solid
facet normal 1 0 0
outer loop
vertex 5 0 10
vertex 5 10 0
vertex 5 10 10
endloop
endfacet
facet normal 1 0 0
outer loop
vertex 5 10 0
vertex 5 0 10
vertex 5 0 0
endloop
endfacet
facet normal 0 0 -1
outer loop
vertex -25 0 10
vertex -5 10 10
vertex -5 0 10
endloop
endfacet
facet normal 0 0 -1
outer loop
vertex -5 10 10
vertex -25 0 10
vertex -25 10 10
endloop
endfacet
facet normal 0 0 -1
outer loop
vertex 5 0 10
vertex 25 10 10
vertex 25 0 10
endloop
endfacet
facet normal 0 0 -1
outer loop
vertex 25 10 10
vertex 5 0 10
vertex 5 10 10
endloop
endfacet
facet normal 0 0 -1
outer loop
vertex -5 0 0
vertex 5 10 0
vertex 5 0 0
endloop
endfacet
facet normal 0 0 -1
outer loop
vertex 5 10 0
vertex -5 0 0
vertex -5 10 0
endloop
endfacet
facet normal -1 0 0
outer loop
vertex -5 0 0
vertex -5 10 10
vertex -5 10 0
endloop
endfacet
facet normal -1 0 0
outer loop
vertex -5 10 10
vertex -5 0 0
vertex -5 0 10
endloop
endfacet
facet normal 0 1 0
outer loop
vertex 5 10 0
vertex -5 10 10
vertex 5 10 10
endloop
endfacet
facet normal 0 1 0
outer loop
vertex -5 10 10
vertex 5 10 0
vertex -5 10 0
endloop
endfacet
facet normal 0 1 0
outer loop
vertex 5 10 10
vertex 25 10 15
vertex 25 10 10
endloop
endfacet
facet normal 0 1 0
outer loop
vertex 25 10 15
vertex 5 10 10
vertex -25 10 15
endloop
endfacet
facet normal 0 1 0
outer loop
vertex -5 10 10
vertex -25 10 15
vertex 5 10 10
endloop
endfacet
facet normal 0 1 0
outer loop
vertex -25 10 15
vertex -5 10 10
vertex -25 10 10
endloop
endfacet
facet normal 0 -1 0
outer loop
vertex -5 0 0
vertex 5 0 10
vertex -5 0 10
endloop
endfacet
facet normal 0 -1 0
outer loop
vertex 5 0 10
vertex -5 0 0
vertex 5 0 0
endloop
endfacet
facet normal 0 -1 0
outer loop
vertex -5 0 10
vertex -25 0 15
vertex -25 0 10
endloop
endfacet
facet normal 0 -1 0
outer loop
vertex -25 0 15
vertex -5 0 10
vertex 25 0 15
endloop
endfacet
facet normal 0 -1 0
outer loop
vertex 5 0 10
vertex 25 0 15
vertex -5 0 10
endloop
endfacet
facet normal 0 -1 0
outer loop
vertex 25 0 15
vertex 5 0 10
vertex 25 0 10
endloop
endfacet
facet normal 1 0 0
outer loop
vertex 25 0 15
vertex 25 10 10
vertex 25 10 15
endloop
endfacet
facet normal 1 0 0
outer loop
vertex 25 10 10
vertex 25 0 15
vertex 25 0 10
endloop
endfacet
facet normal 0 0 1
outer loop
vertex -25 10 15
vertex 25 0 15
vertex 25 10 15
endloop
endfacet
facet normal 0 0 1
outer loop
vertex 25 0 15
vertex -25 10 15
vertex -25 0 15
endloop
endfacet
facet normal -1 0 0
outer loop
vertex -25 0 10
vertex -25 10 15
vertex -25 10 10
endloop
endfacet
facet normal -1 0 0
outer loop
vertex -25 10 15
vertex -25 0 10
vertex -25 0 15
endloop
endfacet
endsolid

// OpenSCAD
$fn=100;

union() { 
	translate([-5,0,0]) cube([10,10,10]); 
	translate([-25,0,10]) cube([50,10,5]); 
}


/*
translate([13,2.5,0]) 
	difference() { 
		cylinder(10,5, 5); 
		translate([0,0,1]) cylinder(11,4.6,4.6); 
	}

translate([10,15,10]) cylinder(11,4.6,0); 

*/
